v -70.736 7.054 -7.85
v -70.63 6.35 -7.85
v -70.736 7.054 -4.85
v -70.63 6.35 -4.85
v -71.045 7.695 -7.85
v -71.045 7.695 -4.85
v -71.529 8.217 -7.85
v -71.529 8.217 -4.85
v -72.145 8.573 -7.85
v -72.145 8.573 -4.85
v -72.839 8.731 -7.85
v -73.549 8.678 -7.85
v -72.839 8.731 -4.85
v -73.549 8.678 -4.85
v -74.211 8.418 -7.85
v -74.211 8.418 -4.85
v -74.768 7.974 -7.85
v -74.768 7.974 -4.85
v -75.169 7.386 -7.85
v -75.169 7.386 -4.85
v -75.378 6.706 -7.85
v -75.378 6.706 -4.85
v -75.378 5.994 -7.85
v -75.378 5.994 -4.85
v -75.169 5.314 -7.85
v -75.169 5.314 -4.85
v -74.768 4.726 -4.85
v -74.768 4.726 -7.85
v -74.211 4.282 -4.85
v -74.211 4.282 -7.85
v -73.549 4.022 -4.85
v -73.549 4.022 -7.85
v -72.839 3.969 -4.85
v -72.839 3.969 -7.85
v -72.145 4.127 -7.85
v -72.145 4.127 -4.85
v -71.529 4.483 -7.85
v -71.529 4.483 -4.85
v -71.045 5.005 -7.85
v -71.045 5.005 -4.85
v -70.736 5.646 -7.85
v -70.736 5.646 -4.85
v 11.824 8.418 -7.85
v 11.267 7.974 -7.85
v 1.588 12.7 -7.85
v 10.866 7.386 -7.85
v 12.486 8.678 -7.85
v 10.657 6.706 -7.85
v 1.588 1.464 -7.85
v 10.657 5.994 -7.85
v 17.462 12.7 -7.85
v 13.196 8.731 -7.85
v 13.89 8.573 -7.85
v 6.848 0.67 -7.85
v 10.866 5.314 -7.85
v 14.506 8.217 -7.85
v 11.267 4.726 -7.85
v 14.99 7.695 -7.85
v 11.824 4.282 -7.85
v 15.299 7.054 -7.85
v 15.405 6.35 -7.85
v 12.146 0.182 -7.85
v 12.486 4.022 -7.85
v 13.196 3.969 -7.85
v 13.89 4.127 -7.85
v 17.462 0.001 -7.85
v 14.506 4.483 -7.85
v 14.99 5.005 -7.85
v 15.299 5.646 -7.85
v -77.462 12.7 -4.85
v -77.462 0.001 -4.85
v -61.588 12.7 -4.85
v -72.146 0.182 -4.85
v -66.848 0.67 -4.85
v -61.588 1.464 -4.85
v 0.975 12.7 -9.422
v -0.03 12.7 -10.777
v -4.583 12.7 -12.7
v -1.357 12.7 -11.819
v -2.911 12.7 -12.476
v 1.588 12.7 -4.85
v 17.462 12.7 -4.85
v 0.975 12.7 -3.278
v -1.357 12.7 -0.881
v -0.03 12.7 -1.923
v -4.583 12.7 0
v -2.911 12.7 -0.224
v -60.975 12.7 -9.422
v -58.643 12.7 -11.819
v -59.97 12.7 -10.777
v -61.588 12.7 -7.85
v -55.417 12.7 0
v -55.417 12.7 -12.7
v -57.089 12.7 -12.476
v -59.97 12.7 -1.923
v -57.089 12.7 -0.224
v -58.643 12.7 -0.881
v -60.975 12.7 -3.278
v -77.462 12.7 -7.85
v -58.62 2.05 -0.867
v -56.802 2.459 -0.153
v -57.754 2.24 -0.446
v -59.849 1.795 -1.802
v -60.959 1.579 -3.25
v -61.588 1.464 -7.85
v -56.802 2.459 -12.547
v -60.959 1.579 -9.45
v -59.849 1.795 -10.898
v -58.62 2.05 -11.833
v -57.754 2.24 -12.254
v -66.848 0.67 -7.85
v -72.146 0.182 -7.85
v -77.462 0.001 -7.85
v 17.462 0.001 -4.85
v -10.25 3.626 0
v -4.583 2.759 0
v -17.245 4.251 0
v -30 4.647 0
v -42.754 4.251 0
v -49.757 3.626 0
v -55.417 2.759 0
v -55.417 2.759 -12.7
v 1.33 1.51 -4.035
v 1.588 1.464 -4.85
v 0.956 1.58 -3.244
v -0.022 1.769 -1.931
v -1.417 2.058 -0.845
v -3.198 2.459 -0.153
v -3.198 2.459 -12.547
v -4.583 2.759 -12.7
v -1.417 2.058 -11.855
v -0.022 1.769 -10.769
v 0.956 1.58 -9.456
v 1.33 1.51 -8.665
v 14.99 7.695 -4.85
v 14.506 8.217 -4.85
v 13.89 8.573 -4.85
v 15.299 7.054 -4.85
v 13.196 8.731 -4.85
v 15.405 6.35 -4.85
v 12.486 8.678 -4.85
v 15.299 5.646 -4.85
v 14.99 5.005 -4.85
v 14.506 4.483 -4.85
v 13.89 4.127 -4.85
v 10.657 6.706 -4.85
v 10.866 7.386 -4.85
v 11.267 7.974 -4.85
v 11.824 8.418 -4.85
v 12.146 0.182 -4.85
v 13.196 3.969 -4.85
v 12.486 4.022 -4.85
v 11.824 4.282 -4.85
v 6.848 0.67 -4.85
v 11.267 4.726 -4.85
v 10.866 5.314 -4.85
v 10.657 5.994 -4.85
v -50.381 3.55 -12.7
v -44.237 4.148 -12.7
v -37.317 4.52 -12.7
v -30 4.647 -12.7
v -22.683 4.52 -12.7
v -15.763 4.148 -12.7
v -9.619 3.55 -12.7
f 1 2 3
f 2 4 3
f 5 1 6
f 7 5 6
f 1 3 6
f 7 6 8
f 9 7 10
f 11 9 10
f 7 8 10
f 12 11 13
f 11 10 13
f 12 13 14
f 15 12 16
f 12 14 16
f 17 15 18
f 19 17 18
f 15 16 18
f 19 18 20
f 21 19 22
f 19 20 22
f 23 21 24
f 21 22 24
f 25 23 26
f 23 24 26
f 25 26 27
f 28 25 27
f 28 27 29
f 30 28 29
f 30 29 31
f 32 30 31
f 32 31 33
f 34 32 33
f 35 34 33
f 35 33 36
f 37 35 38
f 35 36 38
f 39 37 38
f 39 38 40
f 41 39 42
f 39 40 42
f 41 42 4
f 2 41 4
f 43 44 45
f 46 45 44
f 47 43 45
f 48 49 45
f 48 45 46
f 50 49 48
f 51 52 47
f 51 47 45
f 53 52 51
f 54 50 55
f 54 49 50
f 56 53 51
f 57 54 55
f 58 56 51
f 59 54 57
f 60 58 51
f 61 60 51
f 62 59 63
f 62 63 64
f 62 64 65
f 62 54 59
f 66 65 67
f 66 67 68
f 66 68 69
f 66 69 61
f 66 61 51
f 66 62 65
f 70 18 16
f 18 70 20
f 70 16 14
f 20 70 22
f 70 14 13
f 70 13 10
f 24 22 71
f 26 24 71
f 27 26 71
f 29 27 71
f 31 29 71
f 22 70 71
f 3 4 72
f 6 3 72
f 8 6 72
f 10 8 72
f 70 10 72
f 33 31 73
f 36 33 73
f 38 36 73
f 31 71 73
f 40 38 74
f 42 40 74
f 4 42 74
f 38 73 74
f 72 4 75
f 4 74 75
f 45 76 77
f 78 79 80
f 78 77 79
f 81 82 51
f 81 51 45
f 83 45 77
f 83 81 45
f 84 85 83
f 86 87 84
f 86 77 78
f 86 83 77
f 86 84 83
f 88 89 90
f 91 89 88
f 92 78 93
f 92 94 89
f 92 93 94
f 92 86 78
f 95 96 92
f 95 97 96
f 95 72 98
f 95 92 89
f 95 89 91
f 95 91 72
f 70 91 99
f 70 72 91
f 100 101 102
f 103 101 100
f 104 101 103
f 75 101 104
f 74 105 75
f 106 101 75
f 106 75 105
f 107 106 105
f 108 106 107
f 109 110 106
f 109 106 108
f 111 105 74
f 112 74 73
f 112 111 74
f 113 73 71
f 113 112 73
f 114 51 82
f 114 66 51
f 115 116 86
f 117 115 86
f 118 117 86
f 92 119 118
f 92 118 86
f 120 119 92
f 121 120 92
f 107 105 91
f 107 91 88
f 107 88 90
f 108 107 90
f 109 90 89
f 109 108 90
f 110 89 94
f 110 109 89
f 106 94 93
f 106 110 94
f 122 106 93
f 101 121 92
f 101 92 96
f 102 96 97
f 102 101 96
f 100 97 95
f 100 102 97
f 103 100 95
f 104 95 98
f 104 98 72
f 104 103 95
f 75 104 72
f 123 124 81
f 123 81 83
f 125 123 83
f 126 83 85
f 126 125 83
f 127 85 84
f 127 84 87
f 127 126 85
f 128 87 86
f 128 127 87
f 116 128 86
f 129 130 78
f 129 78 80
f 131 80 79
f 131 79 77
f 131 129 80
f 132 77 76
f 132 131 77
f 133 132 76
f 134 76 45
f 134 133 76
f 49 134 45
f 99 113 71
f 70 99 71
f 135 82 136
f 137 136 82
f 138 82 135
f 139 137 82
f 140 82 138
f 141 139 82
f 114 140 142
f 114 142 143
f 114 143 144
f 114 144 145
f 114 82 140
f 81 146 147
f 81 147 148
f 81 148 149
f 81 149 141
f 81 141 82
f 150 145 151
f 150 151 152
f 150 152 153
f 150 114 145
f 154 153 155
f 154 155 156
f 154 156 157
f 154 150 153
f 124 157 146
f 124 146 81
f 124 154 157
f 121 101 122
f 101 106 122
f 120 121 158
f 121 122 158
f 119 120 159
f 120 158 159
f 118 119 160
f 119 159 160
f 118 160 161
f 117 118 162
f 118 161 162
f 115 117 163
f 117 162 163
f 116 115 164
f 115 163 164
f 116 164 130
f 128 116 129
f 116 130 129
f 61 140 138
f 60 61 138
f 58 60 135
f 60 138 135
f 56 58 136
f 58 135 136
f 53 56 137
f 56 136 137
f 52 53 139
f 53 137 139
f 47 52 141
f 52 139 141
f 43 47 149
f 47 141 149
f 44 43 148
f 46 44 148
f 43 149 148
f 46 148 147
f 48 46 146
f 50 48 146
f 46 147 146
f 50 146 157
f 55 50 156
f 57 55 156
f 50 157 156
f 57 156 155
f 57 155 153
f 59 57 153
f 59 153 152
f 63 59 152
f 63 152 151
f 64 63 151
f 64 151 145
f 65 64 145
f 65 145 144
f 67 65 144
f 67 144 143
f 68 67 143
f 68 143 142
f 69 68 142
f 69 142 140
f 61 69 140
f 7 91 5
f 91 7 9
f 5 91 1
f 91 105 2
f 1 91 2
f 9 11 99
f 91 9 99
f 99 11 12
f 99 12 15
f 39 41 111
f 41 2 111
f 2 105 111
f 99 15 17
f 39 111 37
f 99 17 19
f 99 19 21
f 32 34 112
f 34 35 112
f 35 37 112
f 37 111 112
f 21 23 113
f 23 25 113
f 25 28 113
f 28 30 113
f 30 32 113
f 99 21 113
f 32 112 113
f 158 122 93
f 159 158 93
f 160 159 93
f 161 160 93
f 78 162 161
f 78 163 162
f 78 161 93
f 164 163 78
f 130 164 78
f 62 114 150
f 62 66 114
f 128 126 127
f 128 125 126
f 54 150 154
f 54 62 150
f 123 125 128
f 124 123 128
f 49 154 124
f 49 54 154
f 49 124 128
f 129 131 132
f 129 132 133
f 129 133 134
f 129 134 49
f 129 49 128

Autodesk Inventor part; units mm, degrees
ref_plane "YZ Plane" through (0, 0, 0) normal (1, 0, 0) x (0, 1, 0)
ref_plane "XZ Plane" through (0, 0, 0) normal (0, 1, 0) x (-1, 0, 0)
ref_plane "XY Plane" through (0, 0, 0) normal (0, 0, 1) x (1, 0, 0)
sketch "Sketch1" plane through (0, 0, 0) normal (0, 1, 0) x (-1, 0, 0)
  line L0 (77.4625, -7.85) -> (77.4625, -4.85)
  line L1 (0, 0) -> (17.4625, 0) construction
  line L2 (77.4625, -6.35) -> (77.4625, -4.85)
  line L3 (77.4625, -4.85) -> (61.5875, -4.85)
  line L4 (61.5875, -7.85) -> (77.4625, -7.85)
  line L5 (61.5875, -4.85) -> (61.5875, 0)
  line L6 (61.5875, -7.85) -> (61.5875, -12.7)
  line L7 (61.5875, 0) -> (30, 0)
  line L8 (61.5875, -12.7) -> (30, -12.7)
  line L9 (-17.4625, -7.85) -> (-17.4625, -4.85)
  line L10 (-17.4625, -6.35) -> (-17.4625, -4.85)
  line L11 (-17.4625, -4.85) -> (-1.5875, -4.85)
  line L12 (-1.5875, -7.85) -> (-17.4625, -7.85)
  line L13 (-1.5875, -4.85) -> (-1.5875, 0)
  line L14 (-1.5875, -7.85) -> (-1.5875, -12.7)
  line L15 (-1.5875, 0) -> (30, 0)
  line L16 (-1.5875, -12.7) -> (30, -12.7)
  dimension "d23" = 1.5
  dimension "d24" = 15.875
  dimension "d25" = 3
  dimension "d27" = 63.175
  dimension "d117" = 12.7
extrude "Extrusion1" add sketch "Sketch1" along normal blind 12.7
sketch "Sketch3" plane through (1.5875, 0, -12.7) normal (0, 0, -1) x (-1, 0, 0)
  line L0 (0, 0) -> (63.175, 0) projected
  ellipse E0 centre (31.5875, 0) end of major axis (31.5875, 4.6466) minor radius 31.5875
  point P0 (1.5875, 0)
extrude "Extrusion15" cut sketch "Sketch3" against normal blind 20.6375
sketch "Sketch4" plane through (-77.4625, 12.7, -4.85) normal (0, 0, 1) x (1, 0, 0)
  line L0 (15.875, -12.7) -> (15.875, 0) projected
  line L1 (15.875, -6.35) -> (4.445, -6.35)
  circle A0 centre (4.445, -6.35) radius 2.3876
  line L2 (79.05, -12.7) -> (79.05, 0) projected
  line L3 (79.05, -6.35) -> (90.48, -6.35)
  circle A1 centre (90.48, -6.35) radius 2.3876
  point P0 (77.4625, -12.7)
  dimension "d111" = 11.43
  dimension "d112" = 4.7752
  dimension "d113" = 11.43
  dimension "d114" = 4.7752
extrude "Extrusion16" cut sketch "Sketch4" against normal blind 58.7375
fillet "Fillet1" radius 92.075 2 edges at (1.5875, 0, -6.35) (-61.5875, 0, -6.35)
fillet "Fillet2" radius 6.35 4 edges at (1.5875, 7.0818, -12.7) (-61.5875, 7.0818, -12.7) (-61.5875, 7.0818, 0) (1.5875, 7.0818, 0)
properties part number "AllFretBars"
